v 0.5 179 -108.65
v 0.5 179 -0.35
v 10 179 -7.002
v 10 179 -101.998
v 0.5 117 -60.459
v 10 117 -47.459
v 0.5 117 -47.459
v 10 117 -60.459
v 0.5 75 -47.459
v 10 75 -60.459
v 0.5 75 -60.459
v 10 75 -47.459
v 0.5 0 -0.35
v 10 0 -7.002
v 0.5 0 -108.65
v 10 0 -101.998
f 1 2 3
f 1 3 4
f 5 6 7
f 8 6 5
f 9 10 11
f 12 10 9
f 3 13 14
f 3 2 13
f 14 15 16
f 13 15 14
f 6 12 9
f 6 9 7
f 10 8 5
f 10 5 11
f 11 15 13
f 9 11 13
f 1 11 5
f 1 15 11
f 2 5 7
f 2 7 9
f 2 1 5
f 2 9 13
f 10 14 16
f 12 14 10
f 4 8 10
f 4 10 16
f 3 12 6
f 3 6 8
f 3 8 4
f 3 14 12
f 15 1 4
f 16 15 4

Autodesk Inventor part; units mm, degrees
ref_plane "YZ Plane" through (0, 0, 0) normal (1, 0, 0) x (0, 1, 0)
ref_plane "XZ Plane" through (0, 0, 0) normal (0, 1, 0) x (-1, 0, 0)
ref_plane "XY Plane" through (0, 0, 0) normal (0, 0, 1) x (1, 0, 0)
sketch "Sketch1" plane through (0, 0, 0) normal (1, 0, 0) x (0, 1, 0)
  line L0 (0, 0) -> (179, 0)
  line L1 (179, 0) -> (179, -109)
  line L2 (179, -109) -> (0, -109)
  line L3 (0, -109) -> (0, 0)
  dimension "d0" = 179
  dimension "d1" = 109
extrude "Extrusion1" add sketch "Sketch1" along normal blind 10
sketch "Sketch2" plane through (0, 179, 0) normal (0, 1, 0) x (1, 0, 0)
  point P0 (0, 0)
sketch "Sketch3" plane through (0, 179, 0) normal (0, 1, 0) x (1, 0, 0)
  line L0 (0, 109) -> (10, 101.9979)
  line L1 (10, 109) -> (10, 0) projected
  line L2 (0, 109) -> (0, 0) projected
  line L3 (0, 0) -> (10, 0) projected
  line L4 (0, 0) -> (10, 7.0021)
  dimension "d4" = 125
  dimension "d5" = 125
extrude "Extrusion2" cut sketch "Sketch3" against normal through all contours L4 L1 L3
sketch "Sketch4" plane through (0, 179, -109) normal (0, 1, 0) x (1, 0, 0)
  point P0 (0, -109)
sketch "Sketch5" plane through (0, 179, -109) normal (0, 1, 0) x (1, 0, 0)
  line L0 (0, -109) -> (0, 0) projected
  line L1 (10, 0) -> (10, -101.9979) projected
sketch "Sketch6" plane through (0, 179, -109) normal (0, 1, 0) x (1, 0, 0)
  line L0 (0, -109) -> (0, 0) projected
  line L1 (0, 0) -> (10, -7.0021)
  line L2 (10, 0) -> (10, -101.9979) projected
  line L3 (0, 0) -> (10, 0)
  line L4 (0, 0) -> (10, 0) projected
  line L5 (10, 0) -> (10, -7.0021)
  dimension "d8" = 125
extrude "Extrusion3" cut sketch "Sketch6" against normal through all
sketch "Sketch7" plane through (10, 0, 0) normal (1, 0, 0) x (0, 0, -1)
  point P0 (0, 0)
sketch "Sketch8" plane through (10, 0, 0) normal (1, 0, 0) x (0, 0, -1)
  line L0 (47.4589, 117) -> (60.4589, 117)
  line L1 (60.4589, 117) -> (60.4589, 75)
  line L2 (60.4589, 75) -> (47.4589, 75)
  line L3 (47.4589, 75) -> (47.4589, 117)
  line L4 (101.9979, 179) -> (7.0021, 179) projected
  point P0 (0, 0)
  dimension "d11" = 13
  dimension "d12" = 42
  dimension "d13" = 62
extrude "Extrusion4" cut sketch "Sketch8" against normal through all
sketch "Sketch9" plane through (0, 0, 0) normal (0.5736, 0, 0.8192) x (0.8192, 0, -0.5736)
  point P0 (0, 0)
sketch "Sketch10" plane through (0, 0, 0) normal (0.5736, 0, 0.8192) x (0.8192, 0, -0.5736)
  point P0 (0, 0)
sketch "Sketch11" plane through (0, 179, 0) normal (0, 1, 0) x (1, 0, 0)
  line L0 (0, 109) -> (0, 0) projected
  line L1 (0, 109) -> (0.5, 109)
  line L2 (0.5, 109) -> (0.5, 0)
  line L3 (0.5, 0) -> (0, 0)
  line L4 (0, 0) -> (0, 109)
  dimension "d16" = 0.5
extrude "Extrusion5" cut sketch "Sketch11" against normal through all
